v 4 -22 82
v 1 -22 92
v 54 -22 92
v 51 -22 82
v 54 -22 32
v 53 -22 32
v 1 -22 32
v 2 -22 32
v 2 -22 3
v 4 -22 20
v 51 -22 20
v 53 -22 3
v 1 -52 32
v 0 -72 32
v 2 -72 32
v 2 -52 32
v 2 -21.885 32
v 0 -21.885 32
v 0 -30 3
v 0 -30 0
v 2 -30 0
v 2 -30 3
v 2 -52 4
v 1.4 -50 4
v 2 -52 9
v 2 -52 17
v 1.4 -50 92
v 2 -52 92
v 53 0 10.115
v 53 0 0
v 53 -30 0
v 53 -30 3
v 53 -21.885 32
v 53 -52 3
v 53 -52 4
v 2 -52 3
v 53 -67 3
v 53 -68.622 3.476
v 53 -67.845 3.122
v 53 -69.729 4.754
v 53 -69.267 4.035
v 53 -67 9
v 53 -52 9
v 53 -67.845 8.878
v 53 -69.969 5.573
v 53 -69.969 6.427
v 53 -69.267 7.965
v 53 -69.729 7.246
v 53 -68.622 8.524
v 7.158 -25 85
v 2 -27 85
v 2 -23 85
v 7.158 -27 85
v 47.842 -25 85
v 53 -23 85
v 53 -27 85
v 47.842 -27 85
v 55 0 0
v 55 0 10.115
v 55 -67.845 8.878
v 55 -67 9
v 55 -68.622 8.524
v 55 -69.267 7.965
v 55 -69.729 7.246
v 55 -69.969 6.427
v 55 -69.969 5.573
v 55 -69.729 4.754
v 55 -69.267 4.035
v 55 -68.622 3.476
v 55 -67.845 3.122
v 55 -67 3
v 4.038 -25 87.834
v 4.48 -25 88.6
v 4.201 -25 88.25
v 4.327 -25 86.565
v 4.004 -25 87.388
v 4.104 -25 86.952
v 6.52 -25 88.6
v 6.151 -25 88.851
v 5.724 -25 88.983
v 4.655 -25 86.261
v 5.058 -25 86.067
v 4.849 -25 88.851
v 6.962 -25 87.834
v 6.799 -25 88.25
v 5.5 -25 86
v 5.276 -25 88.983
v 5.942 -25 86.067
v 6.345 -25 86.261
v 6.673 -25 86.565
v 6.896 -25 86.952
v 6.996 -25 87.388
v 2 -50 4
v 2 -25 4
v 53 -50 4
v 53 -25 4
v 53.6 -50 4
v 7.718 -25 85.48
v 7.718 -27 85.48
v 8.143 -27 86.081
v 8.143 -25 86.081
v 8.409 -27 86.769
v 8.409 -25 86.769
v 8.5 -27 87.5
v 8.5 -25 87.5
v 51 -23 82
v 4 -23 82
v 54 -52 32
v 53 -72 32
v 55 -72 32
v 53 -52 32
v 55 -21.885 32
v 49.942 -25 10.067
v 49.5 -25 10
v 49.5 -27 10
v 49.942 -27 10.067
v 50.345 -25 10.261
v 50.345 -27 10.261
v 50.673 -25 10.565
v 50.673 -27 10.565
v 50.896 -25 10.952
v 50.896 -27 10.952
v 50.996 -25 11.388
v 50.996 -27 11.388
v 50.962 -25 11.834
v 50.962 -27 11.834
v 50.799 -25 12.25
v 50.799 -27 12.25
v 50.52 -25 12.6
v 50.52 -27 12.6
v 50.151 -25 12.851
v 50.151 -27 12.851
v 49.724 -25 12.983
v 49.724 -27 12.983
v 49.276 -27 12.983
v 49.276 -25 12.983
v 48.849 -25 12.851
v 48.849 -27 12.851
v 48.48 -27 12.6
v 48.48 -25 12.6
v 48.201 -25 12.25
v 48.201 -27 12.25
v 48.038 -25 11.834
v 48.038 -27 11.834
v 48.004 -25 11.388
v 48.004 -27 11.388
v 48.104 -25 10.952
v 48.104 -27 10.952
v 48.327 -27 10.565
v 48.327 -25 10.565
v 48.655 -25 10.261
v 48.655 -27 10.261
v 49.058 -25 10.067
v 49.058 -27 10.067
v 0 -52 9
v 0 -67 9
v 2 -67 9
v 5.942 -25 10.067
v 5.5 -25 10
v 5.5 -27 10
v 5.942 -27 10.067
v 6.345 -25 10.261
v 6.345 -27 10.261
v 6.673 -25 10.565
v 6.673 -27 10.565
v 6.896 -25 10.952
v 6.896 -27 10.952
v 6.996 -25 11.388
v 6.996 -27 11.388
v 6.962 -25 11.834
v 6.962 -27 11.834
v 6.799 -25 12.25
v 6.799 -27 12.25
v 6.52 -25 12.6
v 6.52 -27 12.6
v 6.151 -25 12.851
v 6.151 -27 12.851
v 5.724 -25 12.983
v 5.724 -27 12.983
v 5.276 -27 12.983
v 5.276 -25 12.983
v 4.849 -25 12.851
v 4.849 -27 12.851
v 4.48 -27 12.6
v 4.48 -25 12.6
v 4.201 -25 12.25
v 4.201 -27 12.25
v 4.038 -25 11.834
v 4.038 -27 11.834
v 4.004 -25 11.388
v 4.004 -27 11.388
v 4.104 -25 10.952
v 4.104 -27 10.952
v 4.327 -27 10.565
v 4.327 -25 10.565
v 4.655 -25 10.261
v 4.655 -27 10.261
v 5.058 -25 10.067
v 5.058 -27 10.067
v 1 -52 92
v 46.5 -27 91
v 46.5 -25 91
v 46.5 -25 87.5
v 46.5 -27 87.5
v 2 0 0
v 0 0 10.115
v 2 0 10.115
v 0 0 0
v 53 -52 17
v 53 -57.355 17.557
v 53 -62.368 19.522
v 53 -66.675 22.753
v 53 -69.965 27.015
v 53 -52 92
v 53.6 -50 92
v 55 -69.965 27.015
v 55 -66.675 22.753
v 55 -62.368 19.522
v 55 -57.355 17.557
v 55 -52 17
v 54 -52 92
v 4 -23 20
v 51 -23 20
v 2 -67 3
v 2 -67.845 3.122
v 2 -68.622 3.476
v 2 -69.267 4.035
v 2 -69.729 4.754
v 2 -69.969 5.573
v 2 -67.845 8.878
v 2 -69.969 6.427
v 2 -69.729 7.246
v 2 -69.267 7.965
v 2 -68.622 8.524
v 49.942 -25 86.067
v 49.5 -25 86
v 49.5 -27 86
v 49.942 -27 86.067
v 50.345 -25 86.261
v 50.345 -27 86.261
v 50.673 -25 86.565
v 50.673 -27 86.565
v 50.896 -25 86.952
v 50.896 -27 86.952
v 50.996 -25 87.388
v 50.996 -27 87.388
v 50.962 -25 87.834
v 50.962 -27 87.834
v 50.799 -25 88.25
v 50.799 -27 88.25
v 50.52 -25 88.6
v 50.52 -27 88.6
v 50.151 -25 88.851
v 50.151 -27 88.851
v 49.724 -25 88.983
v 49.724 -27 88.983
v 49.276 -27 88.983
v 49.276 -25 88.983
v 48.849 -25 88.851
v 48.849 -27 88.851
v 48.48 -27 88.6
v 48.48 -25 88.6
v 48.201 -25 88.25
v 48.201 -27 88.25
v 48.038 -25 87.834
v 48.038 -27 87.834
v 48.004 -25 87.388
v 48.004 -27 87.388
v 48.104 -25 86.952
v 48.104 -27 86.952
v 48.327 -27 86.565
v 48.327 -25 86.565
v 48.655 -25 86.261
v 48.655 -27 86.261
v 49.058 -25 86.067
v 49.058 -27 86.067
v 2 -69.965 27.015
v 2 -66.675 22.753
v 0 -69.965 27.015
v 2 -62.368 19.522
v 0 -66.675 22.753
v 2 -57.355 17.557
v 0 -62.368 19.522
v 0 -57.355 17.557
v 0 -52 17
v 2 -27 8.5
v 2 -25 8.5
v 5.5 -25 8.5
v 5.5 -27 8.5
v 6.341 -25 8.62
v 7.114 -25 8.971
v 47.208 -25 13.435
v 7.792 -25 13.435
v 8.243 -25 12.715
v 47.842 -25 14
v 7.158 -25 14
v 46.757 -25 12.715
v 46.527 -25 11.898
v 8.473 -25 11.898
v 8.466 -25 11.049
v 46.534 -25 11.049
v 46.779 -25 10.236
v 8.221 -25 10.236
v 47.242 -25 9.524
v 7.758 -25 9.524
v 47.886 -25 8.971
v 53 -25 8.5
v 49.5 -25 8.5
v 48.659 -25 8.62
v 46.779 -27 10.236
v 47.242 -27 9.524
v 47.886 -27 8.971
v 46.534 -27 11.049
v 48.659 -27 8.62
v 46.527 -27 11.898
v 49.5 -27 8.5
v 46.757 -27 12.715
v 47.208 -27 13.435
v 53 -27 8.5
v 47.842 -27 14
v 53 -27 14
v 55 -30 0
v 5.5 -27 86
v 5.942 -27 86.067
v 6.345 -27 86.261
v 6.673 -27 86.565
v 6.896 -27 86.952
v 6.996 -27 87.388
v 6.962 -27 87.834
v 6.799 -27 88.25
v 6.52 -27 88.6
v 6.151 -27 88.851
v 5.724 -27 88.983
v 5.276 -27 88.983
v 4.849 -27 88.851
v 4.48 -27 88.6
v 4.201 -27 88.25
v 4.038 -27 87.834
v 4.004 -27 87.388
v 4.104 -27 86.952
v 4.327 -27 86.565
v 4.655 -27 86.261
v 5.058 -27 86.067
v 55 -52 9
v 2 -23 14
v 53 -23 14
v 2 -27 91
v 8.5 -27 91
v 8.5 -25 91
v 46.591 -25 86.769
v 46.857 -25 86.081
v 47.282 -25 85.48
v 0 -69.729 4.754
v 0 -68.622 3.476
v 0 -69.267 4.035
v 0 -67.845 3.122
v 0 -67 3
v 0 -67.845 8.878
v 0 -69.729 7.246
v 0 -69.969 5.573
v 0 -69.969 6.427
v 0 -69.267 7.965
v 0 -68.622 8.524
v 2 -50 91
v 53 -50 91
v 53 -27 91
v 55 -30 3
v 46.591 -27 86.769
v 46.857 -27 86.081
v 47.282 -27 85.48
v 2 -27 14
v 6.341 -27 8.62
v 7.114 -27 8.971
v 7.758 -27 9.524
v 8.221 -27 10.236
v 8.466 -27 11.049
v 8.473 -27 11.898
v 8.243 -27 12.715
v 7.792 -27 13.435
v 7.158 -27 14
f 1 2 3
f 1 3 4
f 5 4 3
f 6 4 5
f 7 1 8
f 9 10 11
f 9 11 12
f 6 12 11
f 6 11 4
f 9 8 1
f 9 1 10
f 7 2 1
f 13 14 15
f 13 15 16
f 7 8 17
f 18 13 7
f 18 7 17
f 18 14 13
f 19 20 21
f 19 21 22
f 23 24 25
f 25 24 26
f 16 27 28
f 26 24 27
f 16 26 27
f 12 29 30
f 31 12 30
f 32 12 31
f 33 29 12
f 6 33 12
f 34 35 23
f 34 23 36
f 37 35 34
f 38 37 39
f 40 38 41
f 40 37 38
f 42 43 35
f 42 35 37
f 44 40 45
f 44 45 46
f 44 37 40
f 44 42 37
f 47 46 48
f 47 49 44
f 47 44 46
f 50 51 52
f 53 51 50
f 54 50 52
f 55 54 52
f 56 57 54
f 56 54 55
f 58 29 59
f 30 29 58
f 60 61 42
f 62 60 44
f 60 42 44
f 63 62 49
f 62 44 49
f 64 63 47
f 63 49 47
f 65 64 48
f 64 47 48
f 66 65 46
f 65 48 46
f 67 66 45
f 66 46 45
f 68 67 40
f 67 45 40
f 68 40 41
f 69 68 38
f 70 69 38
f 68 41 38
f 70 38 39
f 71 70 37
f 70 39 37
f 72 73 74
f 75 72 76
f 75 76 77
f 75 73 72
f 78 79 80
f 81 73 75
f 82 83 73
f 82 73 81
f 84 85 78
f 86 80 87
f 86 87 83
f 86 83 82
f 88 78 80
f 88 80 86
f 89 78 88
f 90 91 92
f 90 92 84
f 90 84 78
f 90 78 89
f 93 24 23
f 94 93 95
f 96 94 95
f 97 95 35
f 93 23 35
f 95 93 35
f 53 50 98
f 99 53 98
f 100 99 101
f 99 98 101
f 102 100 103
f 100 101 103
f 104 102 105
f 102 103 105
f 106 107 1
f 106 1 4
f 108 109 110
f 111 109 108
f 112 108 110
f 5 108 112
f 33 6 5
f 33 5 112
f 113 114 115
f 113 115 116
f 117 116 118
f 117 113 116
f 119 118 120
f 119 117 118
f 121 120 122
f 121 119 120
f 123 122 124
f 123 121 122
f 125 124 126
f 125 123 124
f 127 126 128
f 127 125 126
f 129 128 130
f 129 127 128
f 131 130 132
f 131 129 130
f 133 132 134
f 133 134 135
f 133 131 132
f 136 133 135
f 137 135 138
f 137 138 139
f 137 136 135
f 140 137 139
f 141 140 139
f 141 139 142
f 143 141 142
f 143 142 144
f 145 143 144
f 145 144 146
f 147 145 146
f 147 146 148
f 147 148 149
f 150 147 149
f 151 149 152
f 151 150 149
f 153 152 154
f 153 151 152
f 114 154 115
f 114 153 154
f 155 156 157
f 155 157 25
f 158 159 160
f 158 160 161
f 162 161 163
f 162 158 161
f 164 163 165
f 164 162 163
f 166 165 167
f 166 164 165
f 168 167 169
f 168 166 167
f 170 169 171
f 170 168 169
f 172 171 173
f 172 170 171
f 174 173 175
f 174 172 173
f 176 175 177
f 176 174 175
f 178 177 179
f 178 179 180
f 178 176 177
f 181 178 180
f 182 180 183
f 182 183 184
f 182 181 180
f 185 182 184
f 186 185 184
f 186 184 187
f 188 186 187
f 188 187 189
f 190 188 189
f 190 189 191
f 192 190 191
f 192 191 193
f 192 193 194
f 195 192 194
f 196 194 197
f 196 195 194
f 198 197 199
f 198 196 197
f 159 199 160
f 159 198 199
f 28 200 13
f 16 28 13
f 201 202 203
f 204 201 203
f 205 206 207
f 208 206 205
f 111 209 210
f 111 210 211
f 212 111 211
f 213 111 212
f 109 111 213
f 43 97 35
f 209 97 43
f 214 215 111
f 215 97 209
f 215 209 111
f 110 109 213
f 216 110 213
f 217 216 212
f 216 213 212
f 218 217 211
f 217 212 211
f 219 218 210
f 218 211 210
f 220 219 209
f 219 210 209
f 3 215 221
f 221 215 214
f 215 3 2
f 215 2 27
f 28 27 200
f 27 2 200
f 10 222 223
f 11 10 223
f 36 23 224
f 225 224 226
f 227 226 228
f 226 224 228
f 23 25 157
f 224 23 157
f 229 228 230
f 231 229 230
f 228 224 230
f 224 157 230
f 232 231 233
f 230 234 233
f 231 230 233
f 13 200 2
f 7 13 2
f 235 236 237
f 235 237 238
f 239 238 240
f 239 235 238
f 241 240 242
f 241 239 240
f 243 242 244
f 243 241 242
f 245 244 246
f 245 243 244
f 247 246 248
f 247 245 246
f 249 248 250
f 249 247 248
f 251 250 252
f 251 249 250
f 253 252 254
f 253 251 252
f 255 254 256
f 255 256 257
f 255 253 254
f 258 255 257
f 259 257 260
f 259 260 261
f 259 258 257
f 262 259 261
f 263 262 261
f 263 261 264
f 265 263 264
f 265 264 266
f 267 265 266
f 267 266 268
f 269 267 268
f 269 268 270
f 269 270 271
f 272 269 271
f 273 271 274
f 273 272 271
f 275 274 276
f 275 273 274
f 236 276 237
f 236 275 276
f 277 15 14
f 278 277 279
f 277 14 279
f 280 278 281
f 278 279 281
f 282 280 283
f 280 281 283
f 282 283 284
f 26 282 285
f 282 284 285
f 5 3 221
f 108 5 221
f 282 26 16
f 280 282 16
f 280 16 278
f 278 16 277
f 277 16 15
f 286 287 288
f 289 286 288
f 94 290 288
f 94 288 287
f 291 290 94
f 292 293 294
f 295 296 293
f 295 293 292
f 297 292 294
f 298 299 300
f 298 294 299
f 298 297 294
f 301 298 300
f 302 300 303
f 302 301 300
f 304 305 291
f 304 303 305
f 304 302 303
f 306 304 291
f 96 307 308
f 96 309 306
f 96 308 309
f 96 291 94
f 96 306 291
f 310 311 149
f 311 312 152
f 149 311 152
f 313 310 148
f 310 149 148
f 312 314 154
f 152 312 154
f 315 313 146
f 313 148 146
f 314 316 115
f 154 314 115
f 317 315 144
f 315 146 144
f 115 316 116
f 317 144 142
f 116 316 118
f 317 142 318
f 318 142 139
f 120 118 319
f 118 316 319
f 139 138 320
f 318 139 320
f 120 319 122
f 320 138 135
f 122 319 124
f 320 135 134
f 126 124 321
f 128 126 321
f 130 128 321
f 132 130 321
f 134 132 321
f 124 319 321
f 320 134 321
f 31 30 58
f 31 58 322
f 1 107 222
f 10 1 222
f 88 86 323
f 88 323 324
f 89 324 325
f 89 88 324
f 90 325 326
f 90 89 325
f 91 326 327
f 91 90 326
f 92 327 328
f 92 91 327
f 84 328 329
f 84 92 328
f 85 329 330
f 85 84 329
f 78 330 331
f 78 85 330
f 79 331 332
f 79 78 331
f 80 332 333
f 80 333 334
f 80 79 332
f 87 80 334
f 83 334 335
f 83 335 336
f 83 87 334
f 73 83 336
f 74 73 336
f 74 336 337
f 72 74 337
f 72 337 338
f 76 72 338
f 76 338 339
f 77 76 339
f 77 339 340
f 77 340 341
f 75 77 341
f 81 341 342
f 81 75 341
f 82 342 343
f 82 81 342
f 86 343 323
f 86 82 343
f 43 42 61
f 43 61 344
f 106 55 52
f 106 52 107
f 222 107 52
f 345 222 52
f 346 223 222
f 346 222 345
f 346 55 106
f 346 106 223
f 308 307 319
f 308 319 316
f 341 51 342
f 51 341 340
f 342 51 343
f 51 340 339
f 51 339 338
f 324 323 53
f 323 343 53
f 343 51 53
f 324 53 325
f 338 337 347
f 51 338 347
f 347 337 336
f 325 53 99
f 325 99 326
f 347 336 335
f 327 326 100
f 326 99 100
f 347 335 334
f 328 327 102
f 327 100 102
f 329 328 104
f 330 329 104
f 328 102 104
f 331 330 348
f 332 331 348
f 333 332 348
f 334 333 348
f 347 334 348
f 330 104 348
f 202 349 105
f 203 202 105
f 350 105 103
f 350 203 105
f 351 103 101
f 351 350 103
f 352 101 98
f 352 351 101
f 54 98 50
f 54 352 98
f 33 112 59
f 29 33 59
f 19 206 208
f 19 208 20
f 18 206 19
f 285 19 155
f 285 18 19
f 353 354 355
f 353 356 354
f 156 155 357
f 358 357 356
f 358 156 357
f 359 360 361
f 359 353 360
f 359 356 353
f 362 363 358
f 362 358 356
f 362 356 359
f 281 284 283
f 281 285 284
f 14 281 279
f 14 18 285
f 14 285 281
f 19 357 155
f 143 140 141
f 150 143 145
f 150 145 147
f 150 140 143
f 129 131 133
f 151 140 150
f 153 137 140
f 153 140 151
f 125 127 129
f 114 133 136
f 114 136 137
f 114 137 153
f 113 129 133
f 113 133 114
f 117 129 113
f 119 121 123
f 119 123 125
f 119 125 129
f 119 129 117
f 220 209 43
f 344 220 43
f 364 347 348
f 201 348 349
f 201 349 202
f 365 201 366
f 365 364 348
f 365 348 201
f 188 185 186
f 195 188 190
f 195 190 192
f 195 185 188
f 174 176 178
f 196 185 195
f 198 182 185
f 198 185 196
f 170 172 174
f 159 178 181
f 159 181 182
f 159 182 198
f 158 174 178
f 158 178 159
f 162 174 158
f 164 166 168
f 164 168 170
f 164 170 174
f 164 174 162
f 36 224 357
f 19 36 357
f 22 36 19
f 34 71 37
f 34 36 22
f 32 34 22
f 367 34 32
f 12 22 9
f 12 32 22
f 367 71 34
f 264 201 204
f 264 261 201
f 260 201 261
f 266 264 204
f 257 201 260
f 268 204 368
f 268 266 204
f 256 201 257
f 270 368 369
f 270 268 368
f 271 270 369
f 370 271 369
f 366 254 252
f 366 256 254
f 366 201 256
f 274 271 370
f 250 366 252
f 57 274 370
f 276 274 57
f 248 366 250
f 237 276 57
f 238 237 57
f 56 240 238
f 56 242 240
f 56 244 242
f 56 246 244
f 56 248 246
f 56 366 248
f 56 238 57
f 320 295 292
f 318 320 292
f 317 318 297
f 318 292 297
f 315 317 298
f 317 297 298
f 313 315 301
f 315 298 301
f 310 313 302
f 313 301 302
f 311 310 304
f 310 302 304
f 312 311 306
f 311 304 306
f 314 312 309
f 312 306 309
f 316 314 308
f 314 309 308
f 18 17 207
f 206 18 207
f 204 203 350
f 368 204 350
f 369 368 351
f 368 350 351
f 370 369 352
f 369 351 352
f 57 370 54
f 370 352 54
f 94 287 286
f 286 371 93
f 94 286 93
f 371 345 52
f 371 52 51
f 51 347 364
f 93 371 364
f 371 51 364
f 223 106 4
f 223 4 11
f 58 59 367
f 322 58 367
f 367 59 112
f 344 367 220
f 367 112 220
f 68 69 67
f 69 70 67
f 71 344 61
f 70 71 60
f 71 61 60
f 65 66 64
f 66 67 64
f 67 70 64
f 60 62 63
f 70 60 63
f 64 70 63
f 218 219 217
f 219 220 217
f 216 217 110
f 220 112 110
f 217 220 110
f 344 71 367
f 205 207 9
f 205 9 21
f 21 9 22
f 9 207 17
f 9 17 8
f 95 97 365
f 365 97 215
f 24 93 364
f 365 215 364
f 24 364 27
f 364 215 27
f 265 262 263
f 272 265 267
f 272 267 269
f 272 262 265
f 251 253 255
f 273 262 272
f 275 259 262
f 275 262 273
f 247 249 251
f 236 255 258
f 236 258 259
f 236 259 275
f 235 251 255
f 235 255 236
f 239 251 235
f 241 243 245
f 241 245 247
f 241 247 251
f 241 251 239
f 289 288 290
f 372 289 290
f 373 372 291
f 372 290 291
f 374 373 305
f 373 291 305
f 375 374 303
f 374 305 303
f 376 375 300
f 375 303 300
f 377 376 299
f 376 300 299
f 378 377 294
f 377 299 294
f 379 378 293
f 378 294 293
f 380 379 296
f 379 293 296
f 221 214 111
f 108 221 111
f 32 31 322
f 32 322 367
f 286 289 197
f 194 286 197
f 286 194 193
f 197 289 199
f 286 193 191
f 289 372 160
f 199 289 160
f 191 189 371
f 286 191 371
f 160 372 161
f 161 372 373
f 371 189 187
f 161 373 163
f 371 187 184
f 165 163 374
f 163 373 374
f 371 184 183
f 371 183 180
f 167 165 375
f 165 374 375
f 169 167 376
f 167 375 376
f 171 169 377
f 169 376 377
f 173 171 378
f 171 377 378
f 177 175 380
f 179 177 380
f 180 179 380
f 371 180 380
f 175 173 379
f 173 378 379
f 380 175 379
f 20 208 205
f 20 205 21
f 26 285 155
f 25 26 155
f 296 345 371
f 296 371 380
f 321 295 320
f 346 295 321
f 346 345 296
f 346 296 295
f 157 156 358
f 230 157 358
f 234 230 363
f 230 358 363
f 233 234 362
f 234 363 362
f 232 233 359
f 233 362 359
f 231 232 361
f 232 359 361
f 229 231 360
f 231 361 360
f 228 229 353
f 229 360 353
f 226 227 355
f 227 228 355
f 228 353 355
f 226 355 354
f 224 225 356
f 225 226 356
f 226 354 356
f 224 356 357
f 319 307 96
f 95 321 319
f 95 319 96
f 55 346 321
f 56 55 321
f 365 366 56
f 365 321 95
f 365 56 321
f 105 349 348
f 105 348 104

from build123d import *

# Parameters (mm, degrees)
PAD_DEPTH          = 55
SKETCH001_W        = 72
SKETCH001_H        = 51
POCKET_DEPTH       = 30
SKETCH002_W        = 30
SKETCH002_H        = 89
PAD001_DEPTH       = 51
PAD001_FACE5_W     = 30
PAD001_FACE5_H     = 60
PAD002_DEPTH       = 1
PAD002_FACE31_W    = 30
PAD002_FACE31_H    = 60
PAD003_DEPTH       = 1
SKETCH003_W        = 87
SKETCH003_H        = 51
POCKET001_DEPTH    = 27
SKETCH004_W        = 71
SKETCH004_H        = 51
POCKET002_DEPTH    = 2
SKETCH005_W        = 62
SKETCH005_H        = 47
POCKET003_DEPTH    = 1
SKETCH006_R        = 1.5
PAD004_DEPTH       = 2
POCKET004_DEPTH    = 55.001
SKETCH008_W        = 30
SKETCH008_H        = 51
POCKET005_DEPTH    = 2
POCKET005_FACE21_W = 51
POCKET005_FACE21_H = 1
POCKET006_DEPTH    = 2
POCKET007_DEPTH    = 88


with BuildPart() as part:
    # Sketch → Pad (new body)
    with BuildSketch(Plane.YZ):
        with BuildLine():
            Line((0, 0), (-30, 0))
            Line((-30, 0), (-30, 3))
            Line((-30, 3), (-67, 3))
            ThreePointArc((-67, 9), (-70, 6), (-67, 3))
            Line((-67, 9), (-52, 9))
            Line((-52, 9), (-52, 17))
            ThreePointArc((-72, 32), (-64.630858, 20.992189), (-52, 17))
            Line((-72, 32), (0, 32))
            Line((0, 32), (0, 0))
        make_face()
    extrude(amount=PAD_DEPTH)

    # Sketch001 (on Face1 of Pad) → Pocket (cut)
    with BuildSketch(Plane(origin=(0, 0, 32), x_dir=(0, -1, 0), z_dir=(0, 0, 1))):
        with Locations((36, 27.5)):
            Rectangle(SKETCH001_W, SKETCH001_H)
    extrude(amount=-POCKET_DEPTH, mode=Mode.SUBTRACT)

    # Sketch002 (on Face14 of Pocket) → Pad001 (join)
    with BuildSketch(Plane(origin=(53, 0, 0), x_dir=(0, 1, 0), z_dir=(-1, 0, 0))):
        with Locations((-37, -47.5)):
            Rectangle(SKETCH002_W, SKETCH002_H)
    extrude(amount=PAD001_DEPTH)

    # Pad001 Face5 → Pad002 (add)
    with BuildSketch(Plane(origin=(2, -37, 62), x_dir=(0, 1, 0), z_dir=(-1, 0, 0))):
        Rectangle(PAD001_FACE5_W, PAD001_FACE5_H)
    extrude(amount=PAD002_DEPTH)

    # Pad002 Face31 → Pad003 (add)
    with BuildSketch(Plane(origin=(53, -37, 62), x_dir=(0, -1, 0), z_dir=(1, 0, 0))):
        Rectangle(PAD002_FACE31_W, PAD002_FACE31_H)
    extrude(amount=PAD003_DEPTH)

    # Sketch003 (on Face23 of Pad003) → Pocket001 (cut)
    with BuildSketch(Plane(origin=(0, -52, 0), x_dir=(0, 0, -1), z_dir=(0, -1, 0))):
        with Locations((-47.5, 27.5)):
            Rectangle(SKETCH003_W, SKETCH003_H)
    extrude(amount=-POCKET001_DEPTH, mode=Mode.SUBTRACT)

    # Sketch004 (on Face39 of Pocket001) → Pocket002 (cut)
    with BuildSketch(Plane(origin=(0, -25, 0), x_dir=(0, 0, -1), z_dir=(0, -1, 0))):
        with Locations((-49.5, 27.5)):
            Rectangle(SKETCH004_W, SKETCH004_H)
    extrude(amount=-POCKET002_DEPTH, mode=Mode.SUBTRACT)

    # Sketch005 (on Face47 of Pocket002) → Pocket003 (cut)
    with BuildSketch(Plane(origin=(0, -23, 0), x_dir=(0, 0, -1), z_dir=(0, -1, 0))):
        with Locations((-51, 27.5)):
            Rectangle(SKETCH005_W, SKETCH005_H)
    extrude(amount=-POCKET003_DEPTH, mode=Mode.SUBTRACT)

    # Sketch006 (on Face43 of Pocket003) → Pad004 (join)
    with BuildSketch(Plane(origin=(0, -25, 0), x_dir=(0, 0, -1), z_dir=(0, -1, 0))):
        with BuildLine():
            Line((-8.5, 2), (-14, 2))
            Line((-14, 2), (-14, 7.158312))
            ThreePointArc((-8.5, 5.5), (-10.633975, 8.372281), (-14, 7.158312))
            Line((-8.5, 2), (-8.5, 5.5))
        make_face()
        with Locations((-11.5, 5.5)):
            Circle(SKETCH006_R, mode=Mode.SUBTRACT)
        with BuildLine():
            Line((-14, 47.841688), (-14, 53))
            Line((-14, 53), (-8.5, 53))
            Line((-8.5, 53), (-8.5, 49.5))
            ThreePointArc((-14, 47.841688), (-10.633975, 46.627719), (-8.5, 49.5))
        make_face()
        with Locations((-11.5, 49.5)):
            Circle(SKETCH006_R, mode=Mode.SUBTRACT)
        with BuildLine():
            Line((-85, 7.158312), (-85, 2))
            Line((-85, 2), (-91, 2))
            Line((-91, 2), (-91, 8.5))
            Line((-91, 8.5), (-87.5, 8.5))
            ThreePointArc((-85, 7.158312), (-86.081363, 8.143382), (-87.5, 8.5))
        make_face()
        with Locations((-87.5, 5.5)):
            Circle(SKETCH006_R, mode=Mode.SUBTRACT)
        with BuildLine():
            Line((-85, 47.841688), (-85, 53))
            Line((-85, 53), (-91, 53))
            Line((-91, 53), (-91, 46.5))
            Line((-91, 46.5), (-87.5, 46.5))
            ThreePointArc((-87.5, 46.5), (-86.081363, 46.856618), (-85, 47.841688))
        make_face()
        with Locations((-87.5, 49.5)):
            Circle(SKETCH006_R, mode=Mode.SUBTRACT)
    extrude(amount=PAD004_DEPTH)

    # Sketch007 (on Face16 of Pad004) → Pocket004 (cut, through all)
    with BuildSketch(Plane.YZ.offset(55)):
        Polygon((0.114911, 10), (0.114911, 32), (-21.885089, 32), align=None)
    extrude(amount=-POCKET004_DEPTH, mode=Mode.SUBTRACT)

    # Sketch008 (on Face15 of Pocket004) → Pocket005 (cut)
    with BuildSketch(Plane.YX):
        with Locations((-15, 27.5)):
            Rectangle(SKETCH008_W, SKETCH008_H)
    extrude(amount=-POCKET005_DEPTH, mode=Mode.SUBTRACT)

    # Pocket005 Face21 → Pocket006 (cut)
    with BuildSketch(Plane(origin=(27.5, -52, 91.5), x_dir=(-1, 0, 0), z_dir=(0, -1, 0))):
        Rectangle(POCKET005_FACE21_W, POCKET005_FACE21_H)
    extrude(amount=-POCKET006_DEPTH, mode=Mode.SUBTRACT)

    # Sketch009 (on Face20 of Pocket006) → Pocket007 (cut)
    with BuildSketch(Plane(origin=(0, 0, 92), x_dir=(0, -1, 0), z_dir=(0, 0, 1))):
        Polygon((52, 53), (50, 53), (50, 53.6), align=None)
        Polygon((52, 2), (50, 2), (50, 1.4), align=None)
    extrude(amount=-POCKET007_DEPTH, mode=Mode.SUBTRACT)


solid = part.part
